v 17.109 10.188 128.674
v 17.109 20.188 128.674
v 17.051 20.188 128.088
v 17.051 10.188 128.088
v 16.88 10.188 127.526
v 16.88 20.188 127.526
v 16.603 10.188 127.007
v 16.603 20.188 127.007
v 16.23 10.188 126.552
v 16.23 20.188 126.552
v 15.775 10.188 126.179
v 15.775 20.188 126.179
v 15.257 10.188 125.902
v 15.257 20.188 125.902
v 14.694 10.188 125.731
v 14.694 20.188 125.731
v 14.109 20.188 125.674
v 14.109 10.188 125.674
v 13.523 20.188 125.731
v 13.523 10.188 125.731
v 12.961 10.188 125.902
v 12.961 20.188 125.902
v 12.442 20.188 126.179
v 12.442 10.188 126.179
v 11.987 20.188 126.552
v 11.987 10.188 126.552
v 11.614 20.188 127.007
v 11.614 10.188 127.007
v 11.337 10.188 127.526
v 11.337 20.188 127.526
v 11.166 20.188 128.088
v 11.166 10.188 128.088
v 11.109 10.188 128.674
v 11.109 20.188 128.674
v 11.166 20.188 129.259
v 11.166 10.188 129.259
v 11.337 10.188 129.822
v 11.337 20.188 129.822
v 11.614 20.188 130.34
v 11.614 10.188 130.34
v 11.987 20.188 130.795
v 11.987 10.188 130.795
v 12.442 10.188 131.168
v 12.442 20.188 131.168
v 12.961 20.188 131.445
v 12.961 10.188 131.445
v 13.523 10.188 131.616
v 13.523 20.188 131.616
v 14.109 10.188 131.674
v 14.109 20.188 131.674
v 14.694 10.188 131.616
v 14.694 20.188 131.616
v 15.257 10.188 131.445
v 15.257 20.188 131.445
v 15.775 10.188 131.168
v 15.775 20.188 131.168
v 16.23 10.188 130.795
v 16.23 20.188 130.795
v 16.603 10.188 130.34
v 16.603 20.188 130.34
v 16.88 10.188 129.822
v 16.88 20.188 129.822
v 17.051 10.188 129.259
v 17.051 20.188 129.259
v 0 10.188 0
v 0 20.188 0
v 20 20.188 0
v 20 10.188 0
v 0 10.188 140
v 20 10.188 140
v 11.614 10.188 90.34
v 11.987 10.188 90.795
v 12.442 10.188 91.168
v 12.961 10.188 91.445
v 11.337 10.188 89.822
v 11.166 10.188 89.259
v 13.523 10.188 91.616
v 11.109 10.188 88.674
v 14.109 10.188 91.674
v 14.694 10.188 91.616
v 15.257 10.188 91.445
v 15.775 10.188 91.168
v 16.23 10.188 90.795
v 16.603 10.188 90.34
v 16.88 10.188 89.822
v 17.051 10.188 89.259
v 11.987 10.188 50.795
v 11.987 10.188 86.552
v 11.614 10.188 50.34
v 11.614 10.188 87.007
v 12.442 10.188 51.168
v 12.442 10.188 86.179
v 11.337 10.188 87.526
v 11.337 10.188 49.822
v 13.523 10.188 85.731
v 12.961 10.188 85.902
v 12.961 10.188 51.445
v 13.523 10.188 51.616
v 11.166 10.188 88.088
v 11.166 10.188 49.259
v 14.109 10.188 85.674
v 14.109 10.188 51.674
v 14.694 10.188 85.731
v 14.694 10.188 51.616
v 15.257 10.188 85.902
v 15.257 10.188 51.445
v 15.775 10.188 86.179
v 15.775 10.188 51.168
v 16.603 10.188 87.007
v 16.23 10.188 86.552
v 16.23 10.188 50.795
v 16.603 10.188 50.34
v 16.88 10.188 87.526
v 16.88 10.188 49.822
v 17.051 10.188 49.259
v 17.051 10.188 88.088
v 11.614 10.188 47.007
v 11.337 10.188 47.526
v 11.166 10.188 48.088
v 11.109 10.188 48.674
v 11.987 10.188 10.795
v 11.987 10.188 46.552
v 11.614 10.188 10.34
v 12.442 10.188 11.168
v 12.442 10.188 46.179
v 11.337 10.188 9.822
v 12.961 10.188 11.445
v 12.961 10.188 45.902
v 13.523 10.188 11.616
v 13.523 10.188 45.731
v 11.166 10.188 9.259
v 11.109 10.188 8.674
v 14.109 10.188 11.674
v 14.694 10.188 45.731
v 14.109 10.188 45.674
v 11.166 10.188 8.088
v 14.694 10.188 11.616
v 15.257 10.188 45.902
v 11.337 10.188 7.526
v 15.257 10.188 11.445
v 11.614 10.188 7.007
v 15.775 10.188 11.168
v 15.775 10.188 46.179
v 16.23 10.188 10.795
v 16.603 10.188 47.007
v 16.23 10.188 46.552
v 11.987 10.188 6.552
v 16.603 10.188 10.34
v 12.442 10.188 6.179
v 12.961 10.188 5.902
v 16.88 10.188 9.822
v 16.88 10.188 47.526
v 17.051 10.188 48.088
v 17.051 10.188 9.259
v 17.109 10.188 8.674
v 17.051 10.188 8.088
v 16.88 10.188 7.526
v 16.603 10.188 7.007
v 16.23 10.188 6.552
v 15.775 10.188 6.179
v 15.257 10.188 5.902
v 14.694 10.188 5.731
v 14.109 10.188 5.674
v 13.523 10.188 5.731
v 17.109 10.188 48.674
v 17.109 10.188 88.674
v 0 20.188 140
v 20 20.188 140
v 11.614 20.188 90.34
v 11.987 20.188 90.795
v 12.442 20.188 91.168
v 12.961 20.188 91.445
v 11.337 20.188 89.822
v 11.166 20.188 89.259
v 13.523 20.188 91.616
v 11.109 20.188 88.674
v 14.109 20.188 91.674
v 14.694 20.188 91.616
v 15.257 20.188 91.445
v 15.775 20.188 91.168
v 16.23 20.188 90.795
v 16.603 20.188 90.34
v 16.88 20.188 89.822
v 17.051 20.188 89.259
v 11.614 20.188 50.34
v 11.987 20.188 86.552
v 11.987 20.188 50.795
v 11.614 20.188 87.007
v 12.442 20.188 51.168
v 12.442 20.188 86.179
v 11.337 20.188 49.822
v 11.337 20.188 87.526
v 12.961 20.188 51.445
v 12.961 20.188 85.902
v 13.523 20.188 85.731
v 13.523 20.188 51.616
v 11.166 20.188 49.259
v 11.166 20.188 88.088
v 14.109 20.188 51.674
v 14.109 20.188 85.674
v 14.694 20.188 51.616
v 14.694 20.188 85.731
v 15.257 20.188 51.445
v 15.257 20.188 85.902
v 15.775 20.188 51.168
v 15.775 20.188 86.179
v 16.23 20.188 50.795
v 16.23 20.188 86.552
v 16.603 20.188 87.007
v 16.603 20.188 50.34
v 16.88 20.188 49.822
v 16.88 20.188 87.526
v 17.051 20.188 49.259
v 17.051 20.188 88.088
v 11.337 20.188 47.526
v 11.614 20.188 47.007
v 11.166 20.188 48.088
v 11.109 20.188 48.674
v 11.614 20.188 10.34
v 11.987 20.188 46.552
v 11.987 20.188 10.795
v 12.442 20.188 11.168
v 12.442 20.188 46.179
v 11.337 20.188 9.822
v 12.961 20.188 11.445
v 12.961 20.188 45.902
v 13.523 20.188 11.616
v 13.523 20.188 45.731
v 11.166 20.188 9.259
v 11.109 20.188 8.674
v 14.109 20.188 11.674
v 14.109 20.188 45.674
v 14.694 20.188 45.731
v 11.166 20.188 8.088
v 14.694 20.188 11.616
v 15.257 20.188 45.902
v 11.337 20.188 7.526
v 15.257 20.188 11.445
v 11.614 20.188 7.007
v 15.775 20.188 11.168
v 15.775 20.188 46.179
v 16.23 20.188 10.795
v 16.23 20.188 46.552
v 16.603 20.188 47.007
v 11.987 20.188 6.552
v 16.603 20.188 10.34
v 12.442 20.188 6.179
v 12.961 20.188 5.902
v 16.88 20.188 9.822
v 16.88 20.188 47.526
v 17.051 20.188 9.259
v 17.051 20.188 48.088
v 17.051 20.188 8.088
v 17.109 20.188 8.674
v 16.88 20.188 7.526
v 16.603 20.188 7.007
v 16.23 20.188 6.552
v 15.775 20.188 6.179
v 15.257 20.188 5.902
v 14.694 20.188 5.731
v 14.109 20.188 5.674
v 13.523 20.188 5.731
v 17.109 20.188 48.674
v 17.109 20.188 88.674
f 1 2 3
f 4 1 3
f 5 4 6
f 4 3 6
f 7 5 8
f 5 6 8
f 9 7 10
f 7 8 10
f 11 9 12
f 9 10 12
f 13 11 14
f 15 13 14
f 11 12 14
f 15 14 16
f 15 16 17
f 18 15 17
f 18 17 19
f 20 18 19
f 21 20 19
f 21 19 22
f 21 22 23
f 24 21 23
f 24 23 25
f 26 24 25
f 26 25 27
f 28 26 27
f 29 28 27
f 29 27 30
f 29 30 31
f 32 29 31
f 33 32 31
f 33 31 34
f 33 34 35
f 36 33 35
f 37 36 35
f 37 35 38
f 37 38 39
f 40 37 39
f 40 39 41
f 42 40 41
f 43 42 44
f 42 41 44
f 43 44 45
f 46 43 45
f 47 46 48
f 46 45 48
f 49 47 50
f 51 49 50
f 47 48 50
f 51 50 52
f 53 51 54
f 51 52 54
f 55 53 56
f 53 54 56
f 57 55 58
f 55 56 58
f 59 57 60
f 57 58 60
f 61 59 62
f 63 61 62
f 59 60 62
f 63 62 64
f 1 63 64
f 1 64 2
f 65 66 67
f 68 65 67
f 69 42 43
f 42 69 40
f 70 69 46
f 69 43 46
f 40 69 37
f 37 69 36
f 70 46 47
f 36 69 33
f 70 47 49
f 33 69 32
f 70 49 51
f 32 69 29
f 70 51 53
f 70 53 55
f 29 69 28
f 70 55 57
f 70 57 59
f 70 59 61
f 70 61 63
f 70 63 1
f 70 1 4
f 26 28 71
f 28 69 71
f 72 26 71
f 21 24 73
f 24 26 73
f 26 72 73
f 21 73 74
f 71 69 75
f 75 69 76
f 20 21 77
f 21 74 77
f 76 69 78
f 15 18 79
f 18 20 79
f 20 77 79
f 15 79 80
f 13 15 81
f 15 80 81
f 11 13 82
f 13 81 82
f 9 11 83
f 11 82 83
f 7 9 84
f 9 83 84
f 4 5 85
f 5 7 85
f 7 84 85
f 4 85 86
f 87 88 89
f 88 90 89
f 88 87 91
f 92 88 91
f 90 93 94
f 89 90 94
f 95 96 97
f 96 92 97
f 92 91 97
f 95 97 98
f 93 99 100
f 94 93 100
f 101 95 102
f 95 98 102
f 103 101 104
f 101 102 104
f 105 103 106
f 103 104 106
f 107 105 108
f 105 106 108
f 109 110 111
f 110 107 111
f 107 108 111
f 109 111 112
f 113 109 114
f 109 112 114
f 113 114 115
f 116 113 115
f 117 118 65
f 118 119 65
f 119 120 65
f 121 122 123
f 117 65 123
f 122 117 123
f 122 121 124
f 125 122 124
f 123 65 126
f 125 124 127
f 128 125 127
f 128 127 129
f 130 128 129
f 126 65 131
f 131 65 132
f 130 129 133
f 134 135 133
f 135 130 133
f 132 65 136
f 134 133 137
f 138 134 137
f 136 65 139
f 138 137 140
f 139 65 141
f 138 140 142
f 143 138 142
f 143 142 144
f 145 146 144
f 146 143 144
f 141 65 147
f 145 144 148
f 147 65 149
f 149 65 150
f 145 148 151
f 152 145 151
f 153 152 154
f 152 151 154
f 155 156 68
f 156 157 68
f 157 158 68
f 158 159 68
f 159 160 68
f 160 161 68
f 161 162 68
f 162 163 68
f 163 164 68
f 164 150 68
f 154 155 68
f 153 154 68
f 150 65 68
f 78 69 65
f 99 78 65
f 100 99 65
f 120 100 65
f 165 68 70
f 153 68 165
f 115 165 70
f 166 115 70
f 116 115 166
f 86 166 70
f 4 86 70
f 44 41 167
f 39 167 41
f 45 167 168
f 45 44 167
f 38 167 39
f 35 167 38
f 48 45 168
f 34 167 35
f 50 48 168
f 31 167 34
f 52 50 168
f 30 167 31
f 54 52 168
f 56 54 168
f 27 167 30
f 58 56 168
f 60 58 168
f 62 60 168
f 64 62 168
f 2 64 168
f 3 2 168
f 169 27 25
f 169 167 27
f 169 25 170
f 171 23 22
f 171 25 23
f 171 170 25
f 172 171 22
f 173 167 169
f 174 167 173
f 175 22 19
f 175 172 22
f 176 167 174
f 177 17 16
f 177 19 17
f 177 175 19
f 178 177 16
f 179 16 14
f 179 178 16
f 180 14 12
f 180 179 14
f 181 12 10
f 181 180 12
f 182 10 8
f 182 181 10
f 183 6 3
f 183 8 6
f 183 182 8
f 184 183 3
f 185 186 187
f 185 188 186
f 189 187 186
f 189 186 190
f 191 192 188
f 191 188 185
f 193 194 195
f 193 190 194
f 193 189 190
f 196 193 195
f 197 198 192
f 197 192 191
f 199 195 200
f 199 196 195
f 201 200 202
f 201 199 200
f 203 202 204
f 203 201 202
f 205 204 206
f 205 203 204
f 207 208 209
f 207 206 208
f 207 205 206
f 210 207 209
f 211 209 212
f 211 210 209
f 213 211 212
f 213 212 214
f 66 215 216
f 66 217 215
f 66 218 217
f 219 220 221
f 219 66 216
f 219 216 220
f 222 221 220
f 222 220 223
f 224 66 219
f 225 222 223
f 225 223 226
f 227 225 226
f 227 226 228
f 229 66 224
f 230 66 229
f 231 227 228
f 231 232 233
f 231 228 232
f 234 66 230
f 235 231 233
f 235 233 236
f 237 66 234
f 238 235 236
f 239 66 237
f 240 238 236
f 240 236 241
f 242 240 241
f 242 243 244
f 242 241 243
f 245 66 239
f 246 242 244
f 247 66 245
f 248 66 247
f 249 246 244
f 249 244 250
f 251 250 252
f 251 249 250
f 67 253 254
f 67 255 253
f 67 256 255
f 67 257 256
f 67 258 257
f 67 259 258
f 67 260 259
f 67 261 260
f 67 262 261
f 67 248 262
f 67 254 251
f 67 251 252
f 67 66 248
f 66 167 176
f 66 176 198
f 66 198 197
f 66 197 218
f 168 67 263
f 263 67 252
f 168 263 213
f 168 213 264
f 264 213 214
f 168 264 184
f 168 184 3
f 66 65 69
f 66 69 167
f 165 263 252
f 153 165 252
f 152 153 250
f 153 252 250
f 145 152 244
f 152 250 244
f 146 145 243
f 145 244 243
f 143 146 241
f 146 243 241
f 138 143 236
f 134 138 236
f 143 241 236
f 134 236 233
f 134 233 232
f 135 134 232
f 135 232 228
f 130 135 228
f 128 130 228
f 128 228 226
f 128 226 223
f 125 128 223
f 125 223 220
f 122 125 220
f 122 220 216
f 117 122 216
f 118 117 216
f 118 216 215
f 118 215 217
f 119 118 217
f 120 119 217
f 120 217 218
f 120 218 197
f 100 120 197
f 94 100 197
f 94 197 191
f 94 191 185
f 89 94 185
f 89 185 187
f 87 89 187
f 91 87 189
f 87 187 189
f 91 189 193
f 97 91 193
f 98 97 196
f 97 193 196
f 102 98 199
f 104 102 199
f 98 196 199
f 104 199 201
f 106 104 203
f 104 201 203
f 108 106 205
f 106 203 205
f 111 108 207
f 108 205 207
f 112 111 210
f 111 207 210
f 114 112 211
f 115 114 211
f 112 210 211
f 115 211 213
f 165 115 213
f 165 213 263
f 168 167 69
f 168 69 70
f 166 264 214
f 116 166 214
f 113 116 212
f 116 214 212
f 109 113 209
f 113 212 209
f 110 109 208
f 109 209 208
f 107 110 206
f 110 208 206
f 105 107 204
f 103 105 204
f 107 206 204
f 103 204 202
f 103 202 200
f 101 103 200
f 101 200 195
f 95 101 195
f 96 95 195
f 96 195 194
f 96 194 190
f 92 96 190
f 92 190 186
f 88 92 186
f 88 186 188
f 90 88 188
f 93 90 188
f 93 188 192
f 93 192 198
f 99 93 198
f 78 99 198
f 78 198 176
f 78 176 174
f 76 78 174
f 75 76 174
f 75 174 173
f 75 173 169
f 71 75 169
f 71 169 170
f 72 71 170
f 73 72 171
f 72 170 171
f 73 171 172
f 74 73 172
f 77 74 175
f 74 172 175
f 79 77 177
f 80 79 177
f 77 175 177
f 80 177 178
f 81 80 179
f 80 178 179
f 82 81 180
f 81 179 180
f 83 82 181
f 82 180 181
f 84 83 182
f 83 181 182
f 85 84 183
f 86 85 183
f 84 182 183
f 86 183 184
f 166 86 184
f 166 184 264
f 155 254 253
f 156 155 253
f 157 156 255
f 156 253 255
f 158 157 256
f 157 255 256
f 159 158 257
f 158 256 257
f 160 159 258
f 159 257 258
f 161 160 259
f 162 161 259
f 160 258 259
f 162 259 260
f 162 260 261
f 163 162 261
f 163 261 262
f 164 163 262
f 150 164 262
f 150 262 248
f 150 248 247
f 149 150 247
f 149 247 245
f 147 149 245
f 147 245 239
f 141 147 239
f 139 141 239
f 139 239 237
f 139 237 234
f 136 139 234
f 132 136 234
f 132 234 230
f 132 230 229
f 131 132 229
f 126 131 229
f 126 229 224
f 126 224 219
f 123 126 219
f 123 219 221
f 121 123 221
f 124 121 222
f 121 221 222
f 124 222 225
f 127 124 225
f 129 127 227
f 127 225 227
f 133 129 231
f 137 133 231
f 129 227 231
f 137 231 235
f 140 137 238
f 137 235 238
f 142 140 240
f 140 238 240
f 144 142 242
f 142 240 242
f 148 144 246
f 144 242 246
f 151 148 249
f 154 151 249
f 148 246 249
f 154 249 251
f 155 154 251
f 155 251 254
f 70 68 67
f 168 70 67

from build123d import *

# Parameters (mm, degrees)
SKETCH1_W           = 20
SKETCH1_H           = 10
BOSS_EXTRUDE1_DEPTH = 140
SKETCH2_R           = 3
CUT_EXTRUDE1_DEPTH  = 140
LPATTERN1_COUNT     = 4
LPATTERN1_PITCH     = 40


with BuildPart() as part:
    # Sketch1 → Boss-Extrude1 (new body)
    with BuildSketch(Plane.XY):
        with Locations((10, 15.187969925)):
            Rectangle(SKETCH1_W, SKETCH1_H)
    extrude(amount=BOSS_EXTRUDE1_DEPTH)

    # Sketch2 → Cut-Extrude1 (cut)
    with BuildSketch(Plane(origin=(0, 20.187969925, 0), x_dir=(1, 0, 0), z_dir=(0, 1, 0))):
        with Locations((14.108562183, -8.673667423)):
            Circle(SKETCH2_R)
    cut_extrude1 = extrude(amount=-CUT_EXTRUDE1_DEPTH, mode=Mode.SUBTRACT)

    # LPattern1: Cut-Extrude1 ×4
    with Locations(*[(0, 0, i * LPATTERN1_PITCH) for i in range(1, LPATTERN1_COUNT)]):
        add(cut_extrude1, mode=Mode.SUBTRACT)


solid = part.part
